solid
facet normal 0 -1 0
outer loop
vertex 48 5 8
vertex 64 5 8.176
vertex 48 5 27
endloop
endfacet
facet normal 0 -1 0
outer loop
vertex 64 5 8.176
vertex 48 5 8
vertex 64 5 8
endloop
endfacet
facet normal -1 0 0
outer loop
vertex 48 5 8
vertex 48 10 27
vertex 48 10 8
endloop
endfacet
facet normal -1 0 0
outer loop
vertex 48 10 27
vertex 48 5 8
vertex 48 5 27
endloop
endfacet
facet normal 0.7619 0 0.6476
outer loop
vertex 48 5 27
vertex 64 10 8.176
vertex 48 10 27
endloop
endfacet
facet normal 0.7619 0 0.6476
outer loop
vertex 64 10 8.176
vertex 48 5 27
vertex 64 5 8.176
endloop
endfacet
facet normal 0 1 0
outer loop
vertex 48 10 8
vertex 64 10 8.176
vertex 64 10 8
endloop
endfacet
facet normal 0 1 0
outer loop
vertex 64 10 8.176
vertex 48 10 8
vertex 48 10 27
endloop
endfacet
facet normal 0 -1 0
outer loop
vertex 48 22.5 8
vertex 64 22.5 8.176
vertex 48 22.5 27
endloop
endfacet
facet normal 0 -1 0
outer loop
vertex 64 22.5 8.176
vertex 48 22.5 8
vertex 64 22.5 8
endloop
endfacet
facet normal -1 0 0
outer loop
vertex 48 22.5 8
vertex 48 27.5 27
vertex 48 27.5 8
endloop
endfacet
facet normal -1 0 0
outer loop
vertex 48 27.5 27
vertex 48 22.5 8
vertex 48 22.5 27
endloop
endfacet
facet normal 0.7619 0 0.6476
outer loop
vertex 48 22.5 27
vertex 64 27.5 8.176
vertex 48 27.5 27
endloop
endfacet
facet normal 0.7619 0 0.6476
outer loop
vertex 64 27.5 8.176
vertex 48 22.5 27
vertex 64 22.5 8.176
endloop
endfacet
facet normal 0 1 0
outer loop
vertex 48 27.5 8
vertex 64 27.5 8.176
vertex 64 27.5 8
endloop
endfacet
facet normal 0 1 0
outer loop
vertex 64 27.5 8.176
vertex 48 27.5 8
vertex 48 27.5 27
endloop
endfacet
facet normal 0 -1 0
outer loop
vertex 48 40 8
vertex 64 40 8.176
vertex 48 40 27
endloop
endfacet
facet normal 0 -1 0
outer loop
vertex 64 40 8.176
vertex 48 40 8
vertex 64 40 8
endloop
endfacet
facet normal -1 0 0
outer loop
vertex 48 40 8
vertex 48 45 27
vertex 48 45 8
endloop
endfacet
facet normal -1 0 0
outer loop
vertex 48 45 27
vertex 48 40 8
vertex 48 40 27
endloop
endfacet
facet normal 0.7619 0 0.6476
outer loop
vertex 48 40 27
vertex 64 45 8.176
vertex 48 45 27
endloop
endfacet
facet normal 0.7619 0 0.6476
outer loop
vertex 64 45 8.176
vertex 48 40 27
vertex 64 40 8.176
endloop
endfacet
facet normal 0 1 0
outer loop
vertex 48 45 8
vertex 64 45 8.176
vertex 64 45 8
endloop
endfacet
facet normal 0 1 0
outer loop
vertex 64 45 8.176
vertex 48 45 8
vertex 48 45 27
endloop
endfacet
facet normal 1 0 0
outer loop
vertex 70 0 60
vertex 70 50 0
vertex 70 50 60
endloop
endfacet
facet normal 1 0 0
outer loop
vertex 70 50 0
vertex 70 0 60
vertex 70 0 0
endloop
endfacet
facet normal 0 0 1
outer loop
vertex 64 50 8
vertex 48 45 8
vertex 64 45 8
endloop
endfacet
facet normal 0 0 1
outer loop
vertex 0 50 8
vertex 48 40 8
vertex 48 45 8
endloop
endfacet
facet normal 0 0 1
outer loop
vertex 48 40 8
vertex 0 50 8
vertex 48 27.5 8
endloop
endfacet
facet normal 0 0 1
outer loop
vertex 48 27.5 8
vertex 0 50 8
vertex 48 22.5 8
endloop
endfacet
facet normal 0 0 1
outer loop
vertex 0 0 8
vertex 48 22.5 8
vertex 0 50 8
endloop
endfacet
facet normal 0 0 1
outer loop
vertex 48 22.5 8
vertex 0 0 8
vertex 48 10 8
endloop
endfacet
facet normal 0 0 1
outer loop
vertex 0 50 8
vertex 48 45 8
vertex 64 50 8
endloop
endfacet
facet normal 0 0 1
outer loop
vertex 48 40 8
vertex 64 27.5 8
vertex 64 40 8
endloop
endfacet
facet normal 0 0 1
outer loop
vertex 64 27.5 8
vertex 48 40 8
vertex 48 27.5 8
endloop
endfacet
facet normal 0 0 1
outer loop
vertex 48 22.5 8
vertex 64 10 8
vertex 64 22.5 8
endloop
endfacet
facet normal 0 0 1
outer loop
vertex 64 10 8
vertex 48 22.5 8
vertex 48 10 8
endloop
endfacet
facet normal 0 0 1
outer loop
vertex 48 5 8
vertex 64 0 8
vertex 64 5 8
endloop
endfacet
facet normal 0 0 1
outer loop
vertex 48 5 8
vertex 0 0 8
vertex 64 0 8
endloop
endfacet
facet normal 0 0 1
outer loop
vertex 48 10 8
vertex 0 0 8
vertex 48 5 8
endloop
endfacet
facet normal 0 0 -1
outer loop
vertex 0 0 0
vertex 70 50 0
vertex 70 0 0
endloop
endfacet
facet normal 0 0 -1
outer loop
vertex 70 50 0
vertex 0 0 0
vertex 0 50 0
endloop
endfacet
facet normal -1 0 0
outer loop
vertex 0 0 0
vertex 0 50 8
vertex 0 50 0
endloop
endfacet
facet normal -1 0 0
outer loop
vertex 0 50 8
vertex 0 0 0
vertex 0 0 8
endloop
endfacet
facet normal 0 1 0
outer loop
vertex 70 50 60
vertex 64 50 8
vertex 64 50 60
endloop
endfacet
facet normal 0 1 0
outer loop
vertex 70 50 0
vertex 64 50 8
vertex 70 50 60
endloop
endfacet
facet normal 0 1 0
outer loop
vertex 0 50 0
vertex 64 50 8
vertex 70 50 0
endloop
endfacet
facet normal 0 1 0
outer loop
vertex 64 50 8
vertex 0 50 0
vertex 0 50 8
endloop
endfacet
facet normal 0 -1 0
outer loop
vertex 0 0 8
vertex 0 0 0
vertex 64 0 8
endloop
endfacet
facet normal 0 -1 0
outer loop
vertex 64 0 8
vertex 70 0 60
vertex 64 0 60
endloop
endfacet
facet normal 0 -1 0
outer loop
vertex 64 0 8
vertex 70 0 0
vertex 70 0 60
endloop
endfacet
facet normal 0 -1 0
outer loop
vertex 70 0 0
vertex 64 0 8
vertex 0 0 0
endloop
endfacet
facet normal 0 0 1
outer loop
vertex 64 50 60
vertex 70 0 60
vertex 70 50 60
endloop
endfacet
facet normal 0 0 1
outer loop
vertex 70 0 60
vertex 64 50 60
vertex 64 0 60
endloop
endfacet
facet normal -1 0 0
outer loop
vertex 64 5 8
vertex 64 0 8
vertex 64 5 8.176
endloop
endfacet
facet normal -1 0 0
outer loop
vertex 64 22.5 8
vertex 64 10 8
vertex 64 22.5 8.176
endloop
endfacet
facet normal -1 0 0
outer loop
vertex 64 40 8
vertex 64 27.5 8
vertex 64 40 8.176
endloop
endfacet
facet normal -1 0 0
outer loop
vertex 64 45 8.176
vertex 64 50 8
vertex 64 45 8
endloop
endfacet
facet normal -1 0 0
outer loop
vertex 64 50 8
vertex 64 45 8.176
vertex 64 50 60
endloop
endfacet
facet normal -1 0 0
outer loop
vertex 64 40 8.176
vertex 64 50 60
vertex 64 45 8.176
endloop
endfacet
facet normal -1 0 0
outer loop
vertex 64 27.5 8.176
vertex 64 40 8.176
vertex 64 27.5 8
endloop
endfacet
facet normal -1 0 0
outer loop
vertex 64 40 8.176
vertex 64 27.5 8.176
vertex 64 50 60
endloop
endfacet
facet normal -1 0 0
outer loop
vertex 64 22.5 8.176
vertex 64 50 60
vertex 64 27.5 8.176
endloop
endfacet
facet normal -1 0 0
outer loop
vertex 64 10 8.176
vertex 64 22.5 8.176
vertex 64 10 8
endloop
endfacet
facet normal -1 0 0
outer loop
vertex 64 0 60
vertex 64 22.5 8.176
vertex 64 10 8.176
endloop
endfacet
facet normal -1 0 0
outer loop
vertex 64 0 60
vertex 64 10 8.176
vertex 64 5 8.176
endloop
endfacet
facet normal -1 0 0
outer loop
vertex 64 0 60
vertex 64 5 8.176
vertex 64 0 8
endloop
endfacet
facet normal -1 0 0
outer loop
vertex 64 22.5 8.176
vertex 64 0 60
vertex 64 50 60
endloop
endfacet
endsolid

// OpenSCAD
$fn = 32;

// ----------------------------------------------------------------------
// Rib bracket: 3-gusset L bracket
// ----------------------------------------------------------------------

// --- parameters (mm) ---
base_l = 70;              // foot length, X
base_w = 50;              // foot width, Y
base_t = 8;               // foot thickness
plate_t = 6;              // upright plate thickness
plate_h = 60;             // overall height
gus_l = 16;               // gusset leg along the foot
gus_h = 20;               // gusset height
gus_t = 5;                // gusset thickness
gus_edge = 5;             // gusset margin from the foot edge
n_gus = 3;                // gusset count

gus_pitch = (base_w - 2 * gus_edge - gus_t) / (n_gus - 1);  // gusset pitch

union() {
  cube([base_l, base_w, base_t]);
  translate([base_l - plate_t, 0, base_t - 1])
    cube([plate_t, base_w, plate_h - base_t + 1]);
  for (i = [0 : n_gus - 1])
    translate([base_l - plate_t - gus_l, gus_edge + i * gus_pitch, base_t - 1])
      rotate([-90, 0, 0])
        linear_extrude(height = gus_t)
          polygon(points = [[0, 0], [gus_l + 1, 0], [0, -gus_h]]);
}
